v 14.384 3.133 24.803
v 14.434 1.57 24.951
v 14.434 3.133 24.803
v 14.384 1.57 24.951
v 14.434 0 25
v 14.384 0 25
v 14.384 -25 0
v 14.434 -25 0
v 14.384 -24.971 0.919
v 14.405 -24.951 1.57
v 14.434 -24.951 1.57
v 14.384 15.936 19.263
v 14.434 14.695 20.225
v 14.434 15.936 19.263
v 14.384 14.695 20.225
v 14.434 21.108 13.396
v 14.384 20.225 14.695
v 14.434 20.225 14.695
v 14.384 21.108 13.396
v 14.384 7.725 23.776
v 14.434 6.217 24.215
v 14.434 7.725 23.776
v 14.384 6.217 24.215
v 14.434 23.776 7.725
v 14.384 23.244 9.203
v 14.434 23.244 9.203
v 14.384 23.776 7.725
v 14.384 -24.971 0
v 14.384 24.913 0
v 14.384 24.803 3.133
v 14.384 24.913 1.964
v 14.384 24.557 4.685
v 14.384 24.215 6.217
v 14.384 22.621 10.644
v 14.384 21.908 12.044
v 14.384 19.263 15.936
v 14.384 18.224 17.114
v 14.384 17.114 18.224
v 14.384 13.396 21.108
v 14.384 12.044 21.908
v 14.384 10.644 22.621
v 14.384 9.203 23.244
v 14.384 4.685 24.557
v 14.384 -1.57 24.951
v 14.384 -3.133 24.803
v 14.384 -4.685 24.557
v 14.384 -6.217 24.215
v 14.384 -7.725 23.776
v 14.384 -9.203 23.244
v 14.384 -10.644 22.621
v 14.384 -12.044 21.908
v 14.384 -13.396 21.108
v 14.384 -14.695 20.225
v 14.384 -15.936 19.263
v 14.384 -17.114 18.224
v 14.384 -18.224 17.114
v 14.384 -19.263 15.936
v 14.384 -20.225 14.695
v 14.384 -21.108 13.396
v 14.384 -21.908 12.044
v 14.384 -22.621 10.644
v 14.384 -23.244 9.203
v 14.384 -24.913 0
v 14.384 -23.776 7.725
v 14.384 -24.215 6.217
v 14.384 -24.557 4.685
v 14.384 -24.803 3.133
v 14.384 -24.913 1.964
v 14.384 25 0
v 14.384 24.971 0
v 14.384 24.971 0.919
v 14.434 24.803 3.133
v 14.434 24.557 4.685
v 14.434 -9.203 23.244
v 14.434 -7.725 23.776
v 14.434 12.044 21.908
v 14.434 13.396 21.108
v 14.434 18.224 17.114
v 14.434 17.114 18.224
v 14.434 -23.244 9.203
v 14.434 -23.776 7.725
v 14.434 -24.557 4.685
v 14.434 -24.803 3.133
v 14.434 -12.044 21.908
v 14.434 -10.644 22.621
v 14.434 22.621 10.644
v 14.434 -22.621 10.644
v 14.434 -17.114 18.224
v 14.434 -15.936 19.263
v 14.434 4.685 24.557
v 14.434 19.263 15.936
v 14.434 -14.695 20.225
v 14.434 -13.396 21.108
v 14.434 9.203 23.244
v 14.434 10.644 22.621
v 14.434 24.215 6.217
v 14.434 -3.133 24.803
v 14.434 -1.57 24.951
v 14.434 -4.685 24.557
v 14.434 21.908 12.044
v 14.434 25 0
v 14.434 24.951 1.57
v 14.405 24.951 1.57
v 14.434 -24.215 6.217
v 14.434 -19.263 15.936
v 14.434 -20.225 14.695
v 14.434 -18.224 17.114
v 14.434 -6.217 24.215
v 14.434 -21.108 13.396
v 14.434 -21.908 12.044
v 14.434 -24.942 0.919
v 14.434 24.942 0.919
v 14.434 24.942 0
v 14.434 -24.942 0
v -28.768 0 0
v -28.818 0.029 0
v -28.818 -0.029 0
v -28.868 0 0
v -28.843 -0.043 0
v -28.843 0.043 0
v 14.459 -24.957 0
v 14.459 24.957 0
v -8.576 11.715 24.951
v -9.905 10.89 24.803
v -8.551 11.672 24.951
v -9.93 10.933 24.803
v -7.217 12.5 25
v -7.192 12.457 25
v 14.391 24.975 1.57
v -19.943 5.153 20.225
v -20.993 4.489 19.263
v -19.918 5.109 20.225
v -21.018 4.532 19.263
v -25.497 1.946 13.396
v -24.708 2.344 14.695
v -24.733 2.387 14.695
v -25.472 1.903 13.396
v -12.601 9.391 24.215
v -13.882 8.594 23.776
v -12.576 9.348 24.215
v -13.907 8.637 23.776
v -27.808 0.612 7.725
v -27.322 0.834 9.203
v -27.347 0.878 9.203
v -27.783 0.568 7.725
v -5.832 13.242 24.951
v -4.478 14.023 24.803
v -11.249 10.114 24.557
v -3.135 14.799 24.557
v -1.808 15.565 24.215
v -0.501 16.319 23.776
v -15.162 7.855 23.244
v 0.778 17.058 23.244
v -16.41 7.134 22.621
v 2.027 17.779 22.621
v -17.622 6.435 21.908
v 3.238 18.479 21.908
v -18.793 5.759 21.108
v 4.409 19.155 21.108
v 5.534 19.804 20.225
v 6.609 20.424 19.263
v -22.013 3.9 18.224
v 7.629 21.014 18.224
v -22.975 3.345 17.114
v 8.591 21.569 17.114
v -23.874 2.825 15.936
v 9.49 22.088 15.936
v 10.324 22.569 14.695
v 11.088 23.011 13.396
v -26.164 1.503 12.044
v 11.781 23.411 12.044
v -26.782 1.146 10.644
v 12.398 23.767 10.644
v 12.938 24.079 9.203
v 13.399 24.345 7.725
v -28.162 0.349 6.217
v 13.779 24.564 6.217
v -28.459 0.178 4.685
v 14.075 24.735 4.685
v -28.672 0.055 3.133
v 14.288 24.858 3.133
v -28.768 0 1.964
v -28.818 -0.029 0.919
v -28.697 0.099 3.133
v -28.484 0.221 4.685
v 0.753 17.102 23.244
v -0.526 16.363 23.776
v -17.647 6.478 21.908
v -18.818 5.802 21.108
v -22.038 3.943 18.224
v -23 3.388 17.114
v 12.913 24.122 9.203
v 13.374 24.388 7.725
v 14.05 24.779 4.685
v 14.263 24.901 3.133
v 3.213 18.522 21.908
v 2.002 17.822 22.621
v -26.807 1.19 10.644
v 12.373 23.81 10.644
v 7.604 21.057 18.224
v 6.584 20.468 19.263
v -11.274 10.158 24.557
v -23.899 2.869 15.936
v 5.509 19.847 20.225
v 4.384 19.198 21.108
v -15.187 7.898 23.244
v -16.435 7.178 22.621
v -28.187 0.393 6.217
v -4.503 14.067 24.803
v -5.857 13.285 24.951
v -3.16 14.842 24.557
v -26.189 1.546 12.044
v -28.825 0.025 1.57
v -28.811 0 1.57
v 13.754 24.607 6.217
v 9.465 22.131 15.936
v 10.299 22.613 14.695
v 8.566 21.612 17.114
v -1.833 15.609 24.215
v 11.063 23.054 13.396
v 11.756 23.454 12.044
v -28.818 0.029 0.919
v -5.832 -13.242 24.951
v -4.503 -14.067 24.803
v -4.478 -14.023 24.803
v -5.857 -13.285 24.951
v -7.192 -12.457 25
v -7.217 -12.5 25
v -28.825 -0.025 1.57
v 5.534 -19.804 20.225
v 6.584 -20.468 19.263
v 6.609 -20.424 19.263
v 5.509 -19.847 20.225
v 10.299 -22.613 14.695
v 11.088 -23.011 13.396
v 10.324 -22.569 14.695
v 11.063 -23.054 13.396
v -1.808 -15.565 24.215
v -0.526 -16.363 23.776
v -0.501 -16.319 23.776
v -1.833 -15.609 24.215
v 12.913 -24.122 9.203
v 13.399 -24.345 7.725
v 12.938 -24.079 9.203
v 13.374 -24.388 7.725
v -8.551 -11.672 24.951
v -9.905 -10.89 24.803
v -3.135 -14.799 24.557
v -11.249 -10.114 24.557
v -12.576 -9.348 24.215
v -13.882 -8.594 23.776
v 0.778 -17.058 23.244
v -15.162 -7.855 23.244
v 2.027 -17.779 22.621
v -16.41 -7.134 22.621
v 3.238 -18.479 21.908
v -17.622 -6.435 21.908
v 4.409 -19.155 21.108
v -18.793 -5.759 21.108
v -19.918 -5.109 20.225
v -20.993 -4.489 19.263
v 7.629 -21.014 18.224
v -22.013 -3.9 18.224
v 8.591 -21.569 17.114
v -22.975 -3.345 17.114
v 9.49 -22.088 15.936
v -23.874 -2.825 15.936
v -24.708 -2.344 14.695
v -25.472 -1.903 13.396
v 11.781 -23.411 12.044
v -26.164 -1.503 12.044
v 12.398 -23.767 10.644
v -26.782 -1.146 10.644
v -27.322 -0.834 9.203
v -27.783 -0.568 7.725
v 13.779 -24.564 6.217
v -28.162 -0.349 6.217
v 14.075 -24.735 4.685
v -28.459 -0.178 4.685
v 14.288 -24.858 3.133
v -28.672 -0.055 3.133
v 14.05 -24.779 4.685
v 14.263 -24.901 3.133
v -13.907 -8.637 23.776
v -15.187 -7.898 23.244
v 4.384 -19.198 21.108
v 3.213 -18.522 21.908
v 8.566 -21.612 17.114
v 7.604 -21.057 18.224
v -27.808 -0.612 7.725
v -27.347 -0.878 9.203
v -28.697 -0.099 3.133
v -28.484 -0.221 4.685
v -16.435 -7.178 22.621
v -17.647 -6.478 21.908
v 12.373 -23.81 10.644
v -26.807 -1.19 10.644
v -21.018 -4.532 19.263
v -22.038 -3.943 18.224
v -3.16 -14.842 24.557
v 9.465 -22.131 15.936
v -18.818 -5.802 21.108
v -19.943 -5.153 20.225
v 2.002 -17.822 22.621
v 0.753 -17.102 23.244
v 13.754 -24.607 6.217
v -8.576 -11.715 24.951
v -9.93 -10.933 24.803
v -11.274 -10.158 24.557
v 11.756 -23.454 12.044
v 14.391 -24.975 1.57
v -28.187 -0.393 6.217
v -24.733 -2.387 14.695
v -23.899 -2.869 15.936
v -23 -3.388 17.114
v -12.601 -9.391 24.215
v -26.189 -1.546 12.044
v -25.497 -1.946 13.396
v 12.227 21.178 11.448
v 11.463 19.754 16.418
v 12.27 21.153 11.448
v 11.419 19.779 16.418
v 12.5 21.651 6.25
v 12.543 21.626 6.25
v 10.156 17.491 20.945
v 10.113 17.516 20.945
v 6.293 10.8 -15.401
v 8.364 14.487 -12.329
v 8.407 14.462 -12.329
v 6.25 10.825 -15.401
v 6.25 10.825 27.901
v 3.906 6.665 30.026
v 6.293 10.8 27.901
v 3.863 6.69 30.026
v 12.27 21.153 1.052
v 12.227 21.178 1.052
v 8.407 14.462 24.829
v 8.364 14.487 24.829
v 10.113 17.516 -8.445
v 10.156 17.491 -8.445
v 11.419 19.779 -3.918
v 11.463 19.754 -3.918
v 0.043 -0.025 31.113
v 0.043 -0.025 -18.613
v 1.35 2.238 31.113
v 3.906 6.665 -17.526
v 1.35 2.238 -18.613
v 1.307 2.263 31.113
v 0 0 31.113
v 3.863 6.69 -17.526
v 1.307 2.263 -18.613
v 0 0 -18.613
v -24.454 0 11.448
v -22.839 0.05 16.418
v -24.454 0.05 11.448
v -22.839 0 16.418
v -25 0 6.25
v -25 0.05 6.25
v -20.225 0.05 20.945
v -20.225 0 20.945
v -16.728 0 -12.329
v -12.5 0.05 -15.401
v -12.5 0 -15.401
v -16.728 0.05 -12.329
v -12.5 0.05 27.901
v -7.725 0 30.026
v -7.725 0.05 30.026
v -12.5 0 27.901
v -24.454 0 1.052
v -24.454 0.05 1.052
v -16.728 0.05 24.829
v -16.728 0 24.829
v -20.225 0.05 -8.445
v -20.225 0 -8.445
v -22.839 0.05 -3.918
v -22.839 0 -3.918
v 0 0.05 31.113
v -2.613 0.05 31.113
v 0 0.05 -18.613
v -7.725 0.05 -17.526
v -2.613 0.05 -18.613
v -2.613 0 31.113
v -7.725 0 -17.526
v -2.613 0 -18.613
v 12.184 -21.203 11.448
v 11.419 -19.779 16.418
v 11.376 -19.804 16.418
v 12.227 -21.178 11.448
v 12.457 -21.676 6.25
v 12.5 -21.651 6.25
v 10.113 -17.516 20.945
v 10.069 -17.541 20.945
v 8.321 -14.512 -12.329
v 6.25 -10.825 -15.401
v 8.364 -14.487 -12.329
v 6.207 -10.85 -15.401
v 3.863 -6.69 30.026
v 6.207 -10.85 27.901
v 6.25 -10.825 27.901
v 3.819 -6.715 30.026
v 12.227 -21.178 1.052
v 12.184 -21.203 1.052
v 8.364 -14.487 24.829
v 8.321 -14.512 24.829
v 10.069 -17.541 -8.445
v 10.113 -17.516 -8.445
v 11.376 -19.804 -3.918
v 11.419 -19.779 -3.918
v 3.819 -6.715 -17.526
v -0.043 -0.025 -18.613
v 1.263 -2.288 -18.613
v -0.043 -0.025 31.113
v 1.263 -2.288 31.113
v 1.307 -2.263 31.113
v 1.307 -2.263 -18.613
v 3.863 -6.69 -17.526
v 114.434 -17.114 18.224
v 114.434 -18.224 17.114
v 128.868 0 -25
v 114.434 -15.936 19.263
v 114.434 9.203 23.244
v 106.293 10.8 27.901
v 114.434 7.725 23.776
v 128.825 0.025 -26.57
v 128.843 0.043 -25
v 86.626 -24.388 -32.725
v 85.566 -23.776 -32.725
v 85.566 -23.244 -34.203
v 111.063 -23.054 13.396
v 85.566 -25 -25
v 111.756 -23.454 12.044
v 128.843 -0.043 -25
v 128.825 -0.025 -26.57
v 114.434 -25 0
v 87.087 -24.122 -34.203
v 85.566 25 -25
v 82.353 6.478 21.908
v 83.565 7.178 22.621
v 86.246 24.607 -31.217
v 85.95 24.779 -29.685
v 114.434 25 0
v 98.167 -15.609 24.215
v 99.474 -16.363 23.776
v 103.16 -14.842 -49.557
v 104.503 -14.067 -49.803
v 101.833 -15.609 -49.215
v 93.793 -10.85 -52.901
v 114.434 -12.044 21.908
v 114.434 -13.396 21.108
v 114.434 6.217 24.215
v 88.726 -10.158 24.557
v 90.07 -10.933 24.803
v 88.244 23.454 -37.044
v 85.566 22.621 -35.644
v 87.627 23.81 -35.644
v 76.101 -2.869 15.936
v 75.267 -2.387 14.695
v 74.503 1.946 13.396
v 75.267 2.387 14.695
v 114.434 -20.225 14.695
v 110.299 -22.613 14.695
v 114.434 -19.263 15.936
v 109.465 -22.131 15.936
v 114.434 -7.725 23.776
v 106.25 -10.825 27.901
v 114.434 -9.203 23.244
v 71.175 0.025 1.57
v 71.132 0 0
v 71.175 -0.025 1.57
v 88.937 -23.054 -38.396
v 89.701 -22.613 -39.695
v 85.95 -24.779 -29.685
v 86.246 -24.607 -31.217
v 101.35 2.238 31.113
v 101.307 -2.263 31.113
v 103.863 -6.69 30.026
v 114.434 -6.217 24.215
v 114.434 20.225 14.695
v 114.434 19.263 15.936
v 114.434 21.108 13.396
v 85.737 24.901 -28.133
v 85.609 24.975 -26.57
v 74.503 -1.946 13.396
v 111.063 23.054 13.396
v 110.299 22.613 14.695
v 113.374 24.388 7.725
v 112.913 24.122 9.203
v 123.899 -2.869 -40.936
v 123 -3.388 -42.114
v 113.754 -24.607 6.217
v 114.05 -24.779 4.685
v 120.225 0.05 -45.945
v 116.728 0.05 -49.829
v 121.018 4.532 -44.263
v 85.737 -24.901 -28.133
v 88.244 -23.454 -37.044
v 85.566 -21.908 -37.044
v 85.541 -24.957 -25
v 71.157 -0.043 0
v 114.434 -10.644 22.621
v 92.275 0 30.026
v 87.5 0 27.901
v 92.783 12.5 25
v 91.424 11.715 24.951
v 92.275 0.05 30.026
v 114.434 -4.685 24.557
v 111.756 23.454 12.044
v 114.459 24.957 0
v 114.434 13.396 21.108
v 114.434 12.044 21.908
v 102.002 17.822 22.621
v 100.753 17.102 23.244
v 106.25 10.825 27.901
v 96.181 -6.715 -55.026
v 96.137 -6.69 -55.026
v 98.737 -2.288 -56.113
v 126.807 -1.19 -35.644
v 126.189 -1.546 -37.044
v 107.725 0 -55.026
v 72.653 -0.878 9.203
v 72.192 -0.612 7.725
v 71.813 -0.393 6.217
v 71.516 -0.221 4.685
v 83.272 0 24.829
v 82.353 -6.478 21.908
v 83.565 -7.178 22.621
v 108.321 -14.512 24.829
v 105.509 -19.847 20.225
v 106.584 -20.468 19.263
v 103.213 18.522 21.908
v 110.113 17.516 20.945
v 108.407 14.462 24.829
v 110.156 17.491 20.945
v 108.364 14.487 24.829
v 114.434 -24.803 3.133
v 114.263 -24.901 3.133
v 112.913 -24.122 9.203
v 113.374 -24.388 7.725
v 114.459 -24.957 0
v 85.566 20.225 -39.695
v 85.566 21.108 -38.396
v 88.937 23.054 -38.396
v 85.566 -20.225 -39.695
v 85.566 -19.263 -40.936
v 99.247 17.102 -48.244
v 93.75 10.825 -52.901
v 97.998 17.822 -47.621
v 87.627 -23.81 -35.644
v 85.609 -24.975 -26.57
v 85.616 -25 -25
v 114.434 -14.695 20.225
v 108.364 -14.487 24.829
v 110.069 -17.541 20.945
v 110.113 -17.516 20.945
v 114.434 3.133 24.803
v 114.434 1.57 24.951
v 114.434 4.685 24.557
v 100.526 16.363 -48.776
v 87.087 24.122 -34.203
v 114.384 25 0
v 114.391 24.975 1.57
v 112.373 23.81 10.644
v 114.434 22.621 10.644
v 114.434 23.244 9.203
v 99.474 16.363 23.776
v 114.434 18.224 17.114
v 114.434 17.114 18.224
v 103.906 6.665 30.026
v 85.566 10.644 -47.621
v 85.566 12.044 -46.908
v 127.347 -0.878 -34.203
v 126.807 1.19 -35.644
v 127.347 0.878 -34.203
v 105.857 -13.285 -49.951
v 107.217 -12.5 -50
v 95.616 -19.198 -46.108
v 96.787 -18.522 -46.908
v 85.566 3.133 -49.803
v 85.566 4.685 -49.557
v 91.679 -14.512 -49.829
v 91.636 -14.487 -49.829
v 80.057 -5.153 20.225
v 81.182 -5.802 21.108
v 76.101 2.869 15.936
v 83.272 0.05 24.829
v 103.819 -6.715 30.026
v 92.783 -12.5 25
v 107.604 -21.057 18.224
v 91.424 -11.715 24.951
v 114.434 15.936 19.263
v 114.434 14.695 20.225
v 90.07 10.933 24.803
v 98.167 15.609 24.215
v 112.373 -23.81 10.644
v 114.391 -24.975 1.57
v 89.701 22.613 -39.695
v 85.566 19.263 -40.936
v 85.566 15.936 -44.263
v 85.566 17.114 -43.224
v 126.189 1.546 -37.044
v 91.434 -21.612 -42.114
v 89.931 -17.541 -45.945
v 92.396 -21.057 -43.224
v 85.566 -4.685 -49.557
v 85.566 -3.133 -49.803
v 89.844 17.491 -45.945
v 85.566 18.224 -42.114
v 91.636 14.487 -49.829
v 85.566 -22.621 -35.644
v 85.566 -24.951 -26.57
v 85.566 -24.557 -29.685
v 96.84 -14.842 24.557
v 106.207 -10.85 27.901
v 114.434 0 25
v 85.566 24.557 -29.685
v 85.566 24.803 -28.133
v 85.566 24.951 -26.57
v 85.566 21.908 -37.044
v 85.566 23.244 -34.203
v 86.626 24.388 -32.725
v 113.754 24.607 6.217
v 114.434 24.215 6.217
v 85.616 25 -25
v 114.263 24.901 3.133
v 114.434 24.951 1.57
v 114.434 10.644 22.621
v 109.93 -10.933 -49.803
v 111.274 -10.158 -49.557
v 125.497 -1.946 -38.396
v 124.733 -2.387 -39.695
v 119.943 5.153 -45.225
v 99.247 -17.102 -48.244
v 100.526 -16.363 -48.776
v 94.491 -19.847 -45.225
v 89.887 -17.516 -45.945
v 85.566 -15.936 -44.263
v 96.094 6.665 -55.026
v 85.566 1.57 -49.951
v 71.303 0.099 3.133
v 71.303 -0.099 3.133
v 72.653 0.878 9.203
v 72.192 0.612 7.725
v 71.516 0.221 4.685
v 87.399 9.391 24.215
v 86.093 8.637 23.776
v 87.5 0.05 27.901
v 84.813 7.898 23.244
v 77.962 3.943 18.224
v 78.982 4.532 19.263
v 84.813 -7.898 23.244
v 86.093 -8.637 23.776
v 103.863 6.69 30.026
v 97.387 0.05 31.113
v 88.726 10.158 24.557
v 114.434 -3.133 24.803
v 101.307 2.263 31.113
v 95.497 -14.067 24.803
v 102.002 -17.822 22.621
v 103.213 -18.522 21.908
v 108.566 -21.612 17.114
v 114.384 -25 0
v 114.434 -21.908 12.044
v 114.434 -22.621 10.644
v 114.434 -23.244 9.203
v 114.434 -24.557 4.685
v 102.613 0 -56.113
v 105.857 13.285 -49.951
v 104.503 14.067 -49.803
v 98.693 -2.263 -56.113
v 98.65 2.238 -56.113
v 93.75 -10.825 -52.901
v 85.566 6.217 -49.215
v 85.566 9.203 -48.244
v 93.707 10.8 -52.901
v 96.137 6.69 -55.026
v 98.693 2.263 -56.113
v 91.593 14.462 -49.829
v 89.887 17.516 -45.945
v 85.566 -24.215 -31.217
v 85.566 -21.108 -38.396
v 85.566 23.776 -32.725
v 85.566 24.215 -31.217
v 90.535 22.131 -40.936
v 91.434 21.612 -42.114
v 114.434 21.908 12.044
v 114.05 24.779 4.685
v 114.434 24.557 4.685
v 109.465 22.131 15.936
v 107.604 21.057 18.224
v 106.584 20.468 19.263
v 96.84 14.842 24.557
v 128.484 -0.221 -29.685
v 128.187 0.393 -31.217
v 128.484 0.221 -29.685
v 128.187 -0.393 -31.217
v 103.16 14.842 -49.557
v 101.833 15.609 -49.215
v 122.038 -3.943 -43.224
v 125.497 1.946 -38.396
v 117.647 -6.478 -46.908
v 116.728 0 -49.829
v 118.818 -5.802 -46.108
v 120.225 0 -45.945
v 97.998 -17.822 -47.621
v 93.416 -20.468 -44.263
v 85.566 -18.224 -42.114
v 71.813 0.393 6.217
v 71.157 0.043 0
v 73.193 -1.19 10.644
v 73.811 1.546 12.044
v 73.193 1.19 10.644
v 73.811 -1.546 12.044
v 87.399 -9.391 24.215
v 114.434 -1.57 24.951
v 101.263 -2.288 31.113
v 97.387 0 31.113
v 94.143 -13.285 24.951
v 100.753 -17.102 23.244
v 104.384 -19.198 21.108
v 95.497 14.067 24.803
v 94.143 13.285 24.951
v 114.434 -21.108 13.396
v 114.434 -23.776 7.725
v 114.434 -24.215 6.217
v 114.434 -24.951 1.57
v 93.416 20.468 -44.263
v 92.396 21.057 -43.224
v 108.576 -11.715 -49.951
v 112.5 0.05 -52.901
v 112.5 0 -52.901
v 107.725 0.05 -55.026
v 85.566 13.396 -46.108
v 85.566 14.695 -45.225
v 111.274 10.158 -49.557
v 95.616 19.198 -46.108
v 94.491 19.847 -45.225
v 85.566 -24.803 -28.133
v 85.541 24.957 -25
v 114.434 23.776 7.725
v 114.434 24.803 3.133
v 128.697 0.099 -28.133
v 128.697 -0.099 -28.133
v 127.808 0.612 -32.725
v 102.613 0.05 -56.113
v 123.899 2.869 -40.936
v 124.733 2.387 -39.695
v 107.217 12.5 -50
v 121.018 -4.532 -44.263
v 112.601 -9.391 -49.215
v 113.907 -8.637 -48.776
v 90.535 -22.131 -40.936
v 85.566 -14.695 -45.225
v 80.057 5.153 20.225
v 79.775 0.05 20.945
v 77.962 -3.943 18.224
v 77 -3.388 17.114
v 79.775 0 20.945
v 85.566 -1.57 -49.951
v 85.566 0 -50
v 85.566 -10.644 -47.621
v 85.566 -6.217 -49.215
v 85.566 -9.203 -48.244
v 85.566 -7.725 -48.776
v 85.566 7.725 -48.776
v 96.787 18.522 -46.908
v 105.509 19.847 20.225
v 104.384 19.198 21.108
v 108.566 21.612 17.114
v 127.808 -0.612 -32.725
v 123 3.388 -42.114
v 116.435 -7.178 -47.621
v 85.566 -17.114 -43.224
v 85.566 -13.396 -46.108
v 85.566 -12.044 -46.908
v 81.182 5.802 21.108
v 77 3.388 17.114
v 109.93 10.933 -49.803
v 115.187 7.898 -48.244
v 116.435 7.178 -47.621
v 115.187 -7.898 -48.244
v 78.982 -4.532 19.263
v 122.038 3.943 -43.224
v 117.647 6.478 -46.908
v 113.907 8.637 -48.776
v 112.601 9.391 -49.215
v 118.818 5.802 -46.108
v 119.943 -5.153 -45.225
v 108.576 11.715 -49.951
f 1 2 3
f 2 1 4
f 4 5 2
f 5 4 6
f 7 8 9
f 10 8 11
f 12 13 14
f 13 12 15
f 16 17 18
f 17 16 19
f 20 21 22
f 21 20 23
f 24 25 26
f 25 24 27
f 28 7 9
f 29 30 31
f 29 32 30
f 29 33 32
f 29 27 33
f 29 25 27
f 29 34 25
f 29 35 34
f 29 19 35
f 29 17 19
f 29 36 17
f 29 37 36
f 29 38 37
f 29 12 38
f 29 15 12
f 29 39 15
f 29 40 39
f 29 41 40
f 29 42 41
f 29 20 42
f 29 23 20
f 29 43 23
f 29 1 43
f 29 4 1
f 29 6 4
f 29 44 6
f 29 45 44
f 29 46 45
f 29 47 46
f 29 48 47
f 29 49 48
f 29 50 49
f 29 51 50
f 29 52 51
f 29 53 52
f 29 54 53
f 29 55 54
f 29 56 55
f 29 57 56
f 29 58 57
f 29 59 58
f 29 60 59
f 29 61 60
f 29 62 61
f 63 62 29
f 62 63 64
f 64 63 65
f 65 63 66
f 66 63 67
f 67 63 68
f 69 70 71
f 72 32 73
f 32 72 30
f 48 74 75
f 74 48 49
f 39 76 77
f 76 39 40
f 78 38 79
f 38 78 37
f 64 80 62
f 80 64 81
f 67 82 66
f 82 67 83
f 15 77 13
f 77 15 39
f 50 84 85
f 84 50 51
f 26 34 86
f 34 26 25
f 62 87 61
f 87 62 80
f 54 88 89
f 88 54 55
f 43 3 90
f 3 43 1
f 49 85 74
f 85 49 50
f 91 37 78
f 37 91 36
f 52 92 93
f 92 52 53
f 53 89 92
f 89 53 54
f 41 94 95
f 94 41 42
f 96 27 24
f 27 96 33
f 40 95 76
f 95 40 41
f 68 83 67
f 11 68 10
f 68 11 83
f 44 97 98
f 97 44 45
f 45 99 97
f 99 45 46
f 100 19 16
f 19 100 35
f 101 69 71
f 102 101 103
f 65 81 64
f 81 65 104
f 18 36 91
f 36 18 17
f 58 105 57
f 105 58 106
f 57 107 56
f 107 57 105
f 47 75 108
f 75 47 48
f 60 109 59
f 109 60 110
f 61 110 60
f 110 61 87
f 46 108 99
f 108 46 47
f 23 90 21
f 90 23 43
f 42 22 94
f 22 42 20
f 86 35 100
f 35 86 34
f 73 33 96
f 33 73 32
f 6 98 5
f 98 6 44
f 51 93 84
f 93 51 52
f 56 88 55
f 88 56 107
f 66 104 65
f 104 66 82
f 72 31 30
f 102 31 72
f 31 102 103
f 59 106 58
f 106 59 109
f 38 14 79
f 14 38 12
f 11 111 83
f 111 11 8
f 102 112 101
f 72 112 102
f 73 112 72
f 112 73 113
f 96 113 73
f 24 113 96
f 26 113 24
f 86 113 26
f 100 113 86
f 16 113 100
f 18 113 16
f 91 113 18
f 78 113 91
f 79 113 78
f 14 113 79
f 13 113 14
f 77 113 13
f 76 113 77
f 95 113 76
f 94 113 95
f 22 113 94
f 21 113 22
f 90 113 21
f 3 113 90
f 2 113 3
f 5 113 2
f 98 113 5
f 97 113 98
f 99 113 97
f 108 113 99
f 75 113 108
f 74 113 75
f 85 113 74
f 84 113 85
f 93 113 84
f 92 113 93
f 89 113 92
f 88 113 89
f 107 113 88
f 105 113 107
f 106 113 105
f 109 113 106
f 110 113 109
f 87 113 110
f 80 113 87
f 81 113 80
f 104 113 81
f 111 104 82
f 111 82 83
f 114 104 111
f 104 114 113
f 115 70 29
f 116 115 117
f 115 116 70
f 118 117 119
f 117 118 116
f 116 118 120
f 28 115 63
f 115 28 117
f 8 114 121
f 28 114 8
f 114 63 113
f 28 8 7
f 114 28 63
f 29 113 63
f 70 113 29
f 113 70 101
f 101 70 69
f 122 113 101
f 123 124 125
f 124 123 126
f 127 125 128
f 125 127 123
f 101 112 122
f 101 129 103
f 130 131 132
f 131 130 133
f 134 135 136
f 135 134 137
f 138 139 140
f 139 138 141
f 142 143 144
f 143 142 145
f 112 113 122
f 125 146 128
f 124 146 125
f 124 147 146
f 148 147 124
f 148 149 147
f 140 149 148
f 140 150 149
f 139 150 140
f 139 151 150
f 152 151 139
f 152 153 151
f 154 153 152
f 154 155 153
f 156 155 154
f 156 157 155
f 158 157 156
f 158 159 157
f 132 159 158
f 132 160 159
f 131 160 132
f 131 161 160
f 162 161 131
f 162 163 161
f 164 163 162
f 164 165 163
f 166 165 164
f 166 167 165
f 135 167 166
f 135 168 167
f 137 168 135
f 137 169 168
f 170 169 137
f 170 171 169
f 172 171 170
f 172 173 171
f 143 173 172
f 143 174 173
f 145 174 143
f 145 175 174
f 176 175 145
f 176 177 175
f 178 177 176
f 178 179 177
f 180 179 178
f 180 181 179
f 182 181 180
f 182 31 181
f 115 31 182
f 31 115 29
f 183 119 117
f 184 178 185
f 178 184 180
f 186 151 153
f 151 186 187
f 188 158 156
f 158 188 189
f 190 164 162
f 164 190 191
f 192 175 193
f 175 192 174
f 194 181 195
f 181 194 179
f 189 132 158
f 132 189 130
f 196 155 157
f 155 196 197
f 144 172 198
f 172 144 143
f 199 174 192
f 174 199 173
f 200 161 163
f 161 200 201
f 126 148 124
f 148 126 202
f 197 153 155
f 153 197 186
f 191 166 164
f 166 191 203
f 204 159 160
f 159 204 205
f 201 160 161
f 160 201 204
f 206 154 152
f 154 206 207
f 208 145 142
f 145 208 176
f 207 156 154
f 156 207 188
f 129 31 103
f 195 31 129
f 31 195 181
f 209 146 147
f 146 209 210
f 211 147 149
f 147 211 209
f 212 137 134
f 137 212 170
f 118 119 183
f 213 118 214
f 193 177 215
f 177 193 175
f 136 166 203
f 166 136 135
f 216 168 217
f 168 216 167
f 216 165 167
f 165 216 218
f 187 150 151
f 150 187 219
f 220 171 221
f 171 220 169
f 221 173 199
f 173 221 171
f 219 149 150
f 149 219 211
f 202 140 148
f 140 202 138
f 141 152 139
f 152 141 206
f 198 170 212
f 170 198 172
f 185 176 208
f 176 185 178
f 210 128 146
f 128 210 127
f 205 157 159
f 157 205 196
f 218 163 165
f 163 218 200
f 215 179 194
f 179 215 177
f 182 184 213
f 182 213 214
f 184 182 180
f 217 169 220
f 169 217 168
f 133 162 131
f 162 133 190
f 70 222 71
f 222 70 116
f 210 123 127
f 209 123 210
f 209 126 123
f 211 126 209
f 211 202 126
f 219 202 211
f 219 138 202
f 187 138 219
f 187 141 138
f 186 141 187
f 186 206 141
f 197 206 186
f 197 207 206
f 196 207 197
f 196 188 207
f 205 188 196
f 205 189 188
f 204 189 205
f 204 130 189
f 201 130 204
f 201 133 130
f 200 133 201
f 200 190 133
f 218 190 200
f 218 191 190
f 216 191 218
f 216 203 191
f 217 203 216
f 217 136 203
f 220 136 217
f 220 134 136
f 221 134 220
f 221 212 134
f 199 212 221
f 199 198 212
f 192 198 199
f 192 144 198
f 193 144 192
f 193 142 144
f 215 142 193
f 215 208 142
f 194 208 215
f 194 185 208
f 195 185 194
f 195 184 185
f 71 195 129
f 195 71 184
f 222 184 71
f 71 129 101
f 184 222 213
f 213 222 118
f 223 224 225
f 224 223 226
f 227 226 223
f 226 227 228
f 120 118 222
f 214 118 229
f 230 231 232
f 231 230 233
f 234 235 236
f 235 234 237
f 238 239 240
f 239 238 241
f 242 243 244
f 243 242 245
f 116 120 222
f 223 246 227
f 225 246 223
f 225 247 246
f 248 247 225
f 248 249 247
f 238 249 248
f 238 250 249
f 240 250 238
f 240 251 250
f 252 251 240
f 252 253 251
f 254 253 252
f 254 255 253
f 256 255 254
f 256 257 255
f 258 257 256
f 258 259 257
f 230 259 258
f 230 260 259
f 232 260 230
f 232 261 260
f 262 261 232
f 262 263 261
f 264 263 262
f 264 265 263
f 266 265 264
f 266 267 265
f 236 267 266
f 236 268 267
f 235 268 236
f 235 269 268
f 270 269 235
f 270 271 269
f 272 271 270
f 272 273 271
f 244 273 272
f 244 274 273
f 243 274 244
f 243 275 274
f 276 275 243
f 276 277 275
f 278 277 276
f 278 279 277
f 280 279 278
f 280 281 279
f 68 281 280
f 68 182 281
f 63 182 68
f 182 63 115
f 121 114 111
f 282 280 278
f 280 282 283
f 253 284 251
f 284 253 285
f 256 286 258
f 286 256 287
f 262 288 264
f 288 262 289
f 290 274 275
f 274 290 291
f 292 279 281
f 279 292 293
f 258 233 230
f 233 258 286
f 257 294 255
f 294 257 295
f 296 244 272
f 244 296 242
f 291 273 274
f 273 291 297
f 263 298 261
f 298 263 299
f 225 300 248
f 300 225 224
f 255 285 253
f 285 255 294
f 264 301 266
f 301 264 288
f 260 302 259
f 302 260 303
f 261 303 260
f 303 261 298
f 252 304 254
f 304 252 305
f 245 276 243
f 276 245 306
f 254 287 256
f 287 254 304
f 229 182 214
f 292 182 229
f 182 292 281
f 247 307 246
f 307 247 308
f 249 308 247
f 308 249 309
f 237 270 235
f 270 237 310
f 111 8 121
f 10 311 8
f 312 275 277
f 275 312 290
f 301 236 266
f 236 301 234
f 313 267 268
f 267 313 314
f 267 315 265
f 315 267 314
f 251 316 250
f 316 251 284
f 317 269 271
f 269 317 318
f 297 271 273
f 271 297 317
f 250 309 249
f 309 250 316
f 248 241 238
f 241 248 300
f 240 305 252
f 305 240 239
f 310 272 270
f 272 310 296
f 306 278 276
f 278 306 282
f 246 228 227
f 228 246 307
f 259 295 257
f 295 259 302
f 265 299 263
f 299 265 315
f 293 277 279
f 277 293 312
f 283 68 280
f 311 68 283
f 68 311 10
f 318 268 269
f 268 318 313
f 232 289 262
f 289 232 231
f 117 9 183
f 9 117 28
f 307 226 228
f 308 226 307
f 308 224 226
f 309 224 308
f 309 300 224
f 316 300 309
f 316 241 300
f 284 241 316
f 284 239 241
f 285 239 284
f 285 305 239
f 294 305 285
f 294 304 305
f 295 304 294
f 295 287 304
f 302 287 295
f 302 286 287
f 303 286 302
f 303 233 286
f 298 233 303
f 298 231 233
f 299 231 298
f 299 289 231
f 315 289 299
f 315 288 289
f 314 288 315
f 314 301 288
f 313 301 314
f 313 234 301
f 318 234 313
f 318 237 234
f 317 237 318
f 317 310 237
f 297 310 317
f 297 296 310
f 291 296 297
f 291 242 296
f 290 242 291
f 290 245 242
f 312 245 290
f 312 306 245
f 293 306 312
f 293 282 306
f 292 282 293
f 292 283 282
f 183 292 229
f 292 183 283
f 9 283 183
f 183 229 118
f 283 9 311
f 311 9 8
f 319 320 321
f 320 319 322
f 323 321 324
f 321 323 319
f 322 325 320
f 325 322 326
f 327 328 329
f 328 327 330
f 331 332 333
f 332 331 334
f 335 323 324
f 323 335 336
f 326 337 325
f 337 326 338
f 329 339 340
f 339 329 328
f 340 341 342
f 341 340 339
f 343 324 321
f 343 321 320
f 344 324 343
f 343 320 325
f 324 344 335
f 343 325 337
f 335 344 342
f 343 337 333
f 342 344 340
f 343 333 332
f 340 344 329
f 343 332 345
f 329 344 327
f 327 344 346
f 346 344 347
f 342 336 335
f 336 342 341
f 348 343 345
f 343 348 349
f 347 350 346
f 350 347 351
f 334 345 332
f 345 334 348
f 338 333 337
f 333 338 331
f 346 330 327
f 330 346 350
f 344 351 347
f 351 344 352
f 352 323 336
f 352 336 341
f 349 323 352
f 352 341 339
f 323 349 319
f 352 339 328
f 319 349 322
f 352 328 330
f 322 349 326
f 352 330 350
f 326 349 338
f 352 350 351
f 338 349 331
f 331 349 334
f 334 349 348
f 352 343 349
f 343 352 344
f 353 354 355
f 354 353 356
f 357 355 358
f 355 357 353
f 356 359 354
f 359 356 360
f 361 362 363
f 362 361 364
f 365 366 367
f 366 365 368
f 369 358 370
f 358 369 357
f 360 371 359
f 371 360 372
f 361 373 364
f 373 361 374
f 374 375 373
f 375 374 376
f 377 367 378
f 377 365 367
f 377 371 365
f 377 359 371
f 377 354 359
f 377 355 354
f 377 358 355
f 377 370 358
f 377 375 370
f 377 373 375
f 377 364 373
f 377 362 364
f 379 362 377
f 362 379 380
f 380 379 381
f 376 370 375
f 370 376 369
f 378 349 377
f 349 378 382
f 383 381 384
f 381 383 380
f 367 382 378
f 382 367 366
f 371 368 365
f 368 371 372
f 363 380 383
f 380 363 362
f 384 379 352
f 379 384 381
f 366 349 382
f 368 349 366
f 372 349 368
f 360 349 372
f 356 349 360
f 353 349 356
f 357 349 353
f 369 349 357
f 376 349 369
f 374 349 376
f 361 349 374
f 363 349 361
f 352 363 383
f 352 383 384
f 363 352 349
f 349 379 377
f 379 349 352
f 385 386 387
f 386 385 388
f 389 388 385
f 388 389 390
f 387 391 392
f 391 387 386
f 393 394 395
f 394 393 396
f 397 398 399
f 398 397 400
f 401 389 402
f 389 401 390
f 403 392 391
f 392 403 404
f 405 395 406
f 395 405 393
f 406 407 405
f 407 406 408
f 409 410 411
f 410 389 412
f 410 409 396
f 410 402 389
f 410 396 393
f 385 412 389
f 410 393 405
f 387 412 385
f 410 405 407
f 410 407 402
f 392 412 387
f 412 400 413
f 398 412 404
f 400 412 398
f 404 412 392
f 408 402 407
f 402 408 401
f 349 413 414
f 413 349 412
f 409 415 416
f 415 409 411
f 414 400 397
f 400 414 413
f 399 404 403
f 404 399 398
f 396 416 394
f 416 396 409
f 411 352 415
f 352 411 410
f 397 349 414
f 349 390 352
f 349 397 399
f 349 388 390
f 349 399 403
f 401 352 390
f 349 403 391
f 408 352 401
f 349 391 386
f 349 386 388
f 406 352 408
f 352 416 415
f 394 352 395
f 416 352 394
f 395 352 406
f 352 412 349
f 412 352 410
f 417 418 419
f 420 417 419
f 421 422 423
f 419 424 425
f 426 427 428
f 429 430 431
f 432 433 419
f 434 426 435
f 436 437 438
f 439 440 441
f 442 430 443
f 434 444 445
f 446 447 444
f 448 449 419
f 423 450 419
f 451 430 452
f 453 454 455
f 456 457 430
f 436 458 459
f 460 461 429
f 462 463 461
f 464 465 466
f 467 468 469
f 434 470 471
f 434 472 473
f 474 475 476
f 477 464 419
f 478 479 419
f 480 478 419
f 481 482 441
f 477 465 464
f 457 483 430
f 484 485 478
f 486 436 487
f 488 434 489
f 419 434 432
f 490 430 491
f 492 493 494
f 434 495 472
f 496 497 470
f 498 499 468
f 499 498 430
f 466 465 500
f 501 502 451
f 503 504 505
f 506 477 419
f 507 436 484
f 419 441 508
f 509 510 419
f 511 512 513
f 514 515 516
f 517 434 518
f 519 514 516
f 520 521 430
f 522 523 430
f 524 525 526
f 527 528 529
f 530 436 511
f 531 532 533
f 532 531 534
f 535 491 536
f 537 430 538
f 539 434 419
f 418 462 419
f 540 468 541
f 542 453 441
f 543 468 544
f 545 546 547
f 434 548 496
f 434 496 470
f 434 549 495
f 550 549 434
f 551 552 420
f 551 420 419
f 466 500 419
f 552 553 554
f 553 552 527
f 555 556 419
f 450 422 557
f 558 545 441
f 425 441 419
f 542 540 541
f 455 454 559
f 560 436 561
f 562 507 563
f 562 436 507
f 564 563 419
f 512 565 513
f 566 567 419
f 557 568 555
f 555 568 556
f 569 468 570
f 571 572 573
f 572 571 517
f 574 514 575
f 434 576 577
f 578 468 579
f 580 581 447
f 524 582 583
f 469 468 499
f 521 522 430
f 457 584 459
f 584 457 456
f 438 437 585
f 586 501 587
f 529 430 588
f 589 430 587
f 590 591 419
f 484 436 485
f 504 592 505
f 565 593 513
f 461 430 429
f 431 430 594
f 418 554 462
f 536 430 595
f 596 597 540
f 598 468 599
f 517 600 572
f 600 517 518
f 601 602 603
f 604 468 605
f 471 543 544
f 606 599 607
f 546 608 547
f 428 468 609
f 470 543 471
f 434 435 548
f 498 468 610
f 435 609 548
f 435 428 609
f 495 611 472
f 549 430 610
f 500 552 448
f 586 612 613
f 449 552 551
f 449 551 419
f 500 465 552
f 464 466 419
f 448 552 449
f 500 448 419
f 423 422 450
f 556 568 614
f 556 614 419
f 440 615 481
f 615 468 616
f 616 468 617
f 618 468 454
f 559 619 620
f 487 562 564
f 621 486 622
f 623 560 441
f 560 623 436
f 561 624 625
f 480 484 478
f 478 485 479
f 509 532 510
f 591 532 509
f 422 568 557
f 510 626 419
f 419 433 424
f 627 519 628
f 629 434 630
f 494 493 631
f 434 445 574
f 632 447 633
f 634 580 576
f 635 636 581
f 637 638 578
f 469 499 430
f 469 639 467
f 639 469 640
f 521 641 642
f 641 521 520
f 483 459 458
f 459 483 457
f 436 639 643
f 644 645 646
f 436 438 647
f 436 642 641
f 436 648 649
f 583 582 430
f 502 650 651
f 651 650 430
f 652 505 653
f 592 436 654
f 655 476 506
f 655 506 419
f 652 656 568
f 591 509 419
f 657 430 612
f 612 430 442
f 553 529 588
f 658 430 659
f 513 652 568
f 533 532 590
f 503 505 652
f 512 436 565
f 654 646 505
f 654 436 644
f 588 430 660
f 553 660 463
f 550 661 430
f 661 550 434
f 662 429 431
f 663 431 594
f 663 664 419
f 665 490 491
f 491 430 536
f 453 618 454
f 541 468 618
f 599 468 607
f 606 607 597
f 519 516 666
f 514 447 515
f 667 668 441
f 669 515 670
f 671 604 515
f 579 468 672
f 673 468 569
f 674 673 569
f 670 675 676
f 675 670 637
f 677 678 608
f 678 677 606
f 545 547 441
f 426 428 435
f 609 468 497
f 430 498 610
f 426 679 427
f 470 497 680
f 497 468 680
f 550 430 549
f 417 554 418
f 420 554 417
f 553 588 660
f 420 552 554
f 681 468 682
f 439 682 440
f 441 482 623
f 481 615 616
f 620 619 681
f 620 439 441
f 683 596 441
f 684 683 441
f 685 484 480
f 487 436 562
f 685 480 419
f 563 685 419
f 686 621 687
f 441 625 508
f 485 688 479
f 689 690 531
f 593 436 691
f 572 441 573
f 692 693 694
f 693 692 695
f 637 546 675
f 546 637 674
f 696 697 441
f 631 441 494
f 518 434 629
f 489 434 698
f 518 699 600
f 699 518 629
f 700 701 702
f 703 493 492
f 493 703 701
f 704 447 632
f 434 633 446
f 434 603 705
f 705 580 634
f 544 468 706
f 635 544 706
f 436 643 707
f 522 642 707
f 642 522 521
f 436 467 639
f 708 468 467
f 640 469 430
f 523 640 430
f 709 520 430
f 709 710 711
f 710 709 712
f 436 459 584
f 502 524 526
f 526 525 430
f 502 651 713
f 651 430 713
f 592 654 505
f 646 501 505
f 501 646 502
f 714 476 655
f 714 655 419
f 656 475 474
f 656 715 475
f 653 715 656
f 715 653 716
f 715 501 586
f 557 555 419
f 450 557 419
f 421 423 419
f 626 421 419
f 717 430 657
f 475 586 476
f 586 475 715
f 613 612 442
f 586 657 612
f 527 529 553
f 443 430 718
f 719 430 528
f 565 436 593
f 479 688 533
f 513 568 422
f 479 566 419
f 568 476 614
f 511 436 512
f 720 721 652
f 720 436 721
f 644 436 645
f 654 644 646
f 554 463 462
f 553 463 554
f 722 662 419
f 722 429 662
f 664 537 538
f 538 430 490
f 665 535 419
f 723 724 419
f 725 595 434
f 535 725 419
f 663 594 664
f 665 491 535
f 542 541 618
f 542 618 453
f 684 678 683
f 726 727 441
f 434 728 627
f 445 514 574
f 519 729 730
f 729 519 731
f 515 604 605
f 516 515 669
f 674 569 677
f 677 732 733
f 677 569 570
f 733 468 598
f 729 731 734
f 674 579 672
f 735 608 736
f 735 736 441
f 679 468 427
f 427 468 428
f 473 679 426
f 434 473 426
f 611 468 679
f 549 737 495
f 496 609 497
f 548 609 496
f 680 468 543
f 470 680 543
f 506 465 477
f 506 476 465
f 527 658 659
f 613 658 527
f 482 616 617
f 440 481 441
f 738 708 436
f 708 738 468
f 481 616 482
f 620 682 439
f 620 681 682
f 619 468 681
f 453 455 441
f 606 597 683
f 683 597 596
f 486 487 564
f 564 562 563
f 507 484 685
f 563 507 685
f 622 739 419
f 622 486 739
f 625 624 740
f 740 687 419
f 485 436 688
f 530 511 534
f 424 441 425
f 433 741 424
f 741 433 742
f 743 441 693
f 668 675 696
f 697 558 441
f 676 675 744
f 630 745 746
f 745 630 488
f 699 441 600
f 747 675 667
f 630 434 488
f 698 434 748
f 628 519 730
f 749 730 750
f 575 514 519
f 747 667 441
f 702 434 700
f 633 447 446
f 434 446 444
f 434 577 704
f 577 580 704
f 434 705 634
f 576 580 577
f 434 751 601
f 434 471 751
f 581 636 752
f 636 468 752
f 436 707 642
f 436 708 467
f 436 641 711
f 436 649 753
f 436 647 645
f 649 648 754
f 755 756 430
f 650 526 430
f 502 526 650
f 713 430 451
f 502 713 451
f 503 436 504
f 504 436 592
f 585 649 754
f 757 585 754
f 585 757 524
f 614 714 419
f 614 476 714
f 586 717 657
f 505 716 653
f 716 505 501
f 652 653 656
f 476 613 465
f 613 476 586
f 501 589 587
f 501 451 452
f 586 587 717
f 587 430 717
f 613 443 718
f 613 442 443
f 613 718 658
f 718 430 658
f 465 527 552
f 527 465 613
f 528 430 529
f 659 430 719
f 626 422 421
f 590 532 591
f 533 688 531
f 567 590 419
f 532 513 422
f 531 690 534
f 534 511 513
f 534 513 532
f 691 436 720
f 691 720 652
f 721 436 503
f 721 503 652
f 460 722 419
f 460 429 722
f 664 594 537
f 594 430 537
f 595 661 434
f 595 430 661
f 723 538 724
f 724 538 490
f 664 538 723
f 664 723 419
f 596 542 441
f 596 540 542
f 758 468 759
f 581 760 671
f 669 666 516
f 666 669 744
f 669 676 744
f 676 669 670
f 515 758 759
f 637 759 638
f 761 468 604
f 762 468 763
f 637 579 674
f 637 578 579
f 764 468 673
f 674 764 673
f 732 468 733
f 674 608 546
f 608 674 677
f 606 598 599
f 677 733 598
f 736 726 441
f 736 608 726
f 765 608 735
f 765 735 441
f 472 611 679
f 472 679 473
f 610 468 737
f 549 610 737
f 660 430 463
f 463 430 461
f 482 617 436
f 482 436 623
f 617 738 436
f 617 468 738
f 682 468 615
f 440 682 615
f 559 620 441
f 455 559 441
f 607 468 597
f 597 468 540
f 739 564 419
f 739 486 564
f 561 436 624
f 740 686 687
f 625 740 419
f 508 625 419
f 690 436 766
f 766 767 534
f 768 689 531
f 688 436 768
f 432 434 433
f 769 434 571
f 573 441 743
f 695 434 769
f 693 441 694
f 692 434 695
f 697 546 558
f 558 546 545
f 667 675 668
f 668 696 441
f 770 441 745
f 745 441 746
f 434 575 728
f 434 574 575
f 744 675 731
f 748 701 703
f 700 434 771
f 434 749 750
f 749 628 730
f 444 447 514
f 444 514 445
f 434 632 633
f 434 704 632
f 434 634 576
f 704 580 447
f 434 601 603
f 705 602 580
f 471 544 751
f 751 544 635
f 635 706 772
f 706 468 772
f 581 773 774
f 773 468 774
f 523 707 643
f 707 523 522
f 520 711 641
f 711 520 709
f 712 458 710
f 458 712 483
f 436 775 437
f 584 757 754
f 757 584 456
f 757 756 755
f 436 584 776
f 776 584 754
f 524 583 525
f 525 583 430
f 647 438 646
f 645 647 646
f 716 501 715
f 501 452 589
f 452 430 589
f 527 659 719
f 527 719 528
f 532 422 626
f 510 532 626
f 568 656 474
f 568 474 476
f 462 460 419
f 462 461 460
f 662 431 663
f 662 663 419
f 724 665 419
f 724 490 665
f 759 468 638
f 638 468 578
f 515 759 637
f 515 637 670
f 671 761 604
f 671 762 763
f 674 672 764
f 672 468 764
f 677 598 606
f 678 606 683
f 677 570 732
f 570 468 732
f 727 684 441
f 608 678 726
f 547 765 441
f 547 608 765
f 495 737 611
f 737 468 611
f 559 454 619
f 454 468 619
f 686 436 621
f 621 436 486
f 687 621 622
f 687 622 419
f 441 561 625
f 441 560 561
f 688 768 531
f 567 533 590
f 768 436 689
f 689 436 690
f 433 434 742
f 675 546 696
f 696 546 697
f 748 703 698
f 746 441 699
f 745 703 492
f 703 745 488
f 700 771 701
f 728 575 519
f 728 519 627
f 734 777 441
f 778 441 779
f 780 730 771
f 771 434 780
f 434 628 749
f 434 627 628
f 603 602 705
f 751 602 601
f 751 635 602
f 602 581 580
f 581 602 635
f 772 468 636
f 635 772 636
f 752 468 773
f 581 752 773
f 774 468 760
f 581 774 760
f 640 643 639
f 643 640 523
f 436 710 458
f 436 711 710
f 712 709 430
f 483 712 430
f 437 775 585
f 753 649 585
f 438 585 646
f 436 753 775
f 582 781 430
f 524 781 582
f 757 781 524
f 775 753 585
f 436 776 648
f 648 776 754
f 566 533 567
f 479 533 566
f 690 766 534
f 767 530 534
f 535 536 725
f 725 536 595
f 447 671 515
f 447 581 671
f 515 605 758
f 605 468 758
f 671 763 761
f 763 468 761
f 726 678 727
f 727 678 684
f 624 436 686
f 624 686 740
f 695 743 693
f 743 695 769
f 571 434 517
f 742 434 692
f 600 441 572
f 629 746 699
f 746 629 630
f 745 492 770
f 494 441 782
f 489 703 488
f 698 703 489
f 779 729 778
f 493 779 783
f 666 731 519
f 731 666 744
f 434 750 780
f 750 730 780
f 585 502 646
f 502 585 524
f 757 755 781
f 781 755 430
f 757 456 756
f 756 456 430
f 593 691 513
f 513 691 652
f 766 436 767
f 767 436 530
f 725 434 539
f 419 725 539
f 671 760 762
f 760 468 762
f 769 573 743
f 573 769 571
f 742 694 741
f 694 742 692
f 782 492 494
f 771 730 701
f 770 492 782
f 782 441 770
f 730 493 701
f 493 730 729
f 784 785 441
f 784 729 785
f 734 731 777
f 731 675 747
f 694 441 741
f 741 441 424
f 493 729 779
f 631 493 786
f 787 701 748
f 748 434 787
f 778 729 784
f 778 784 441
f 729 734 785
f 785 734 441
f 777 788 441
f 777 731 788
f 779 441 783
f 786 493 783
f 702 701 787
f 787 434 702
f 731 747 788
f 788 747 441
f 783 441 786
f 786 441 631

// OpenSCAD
diameter = 50;
radius = diameter / 2;



//module cap(){
//
//    intersection(){
//        sphere(d = diameter);
//
//
//        linear_extrude(diameter)
//        polygon([
//            radius * [cos(0), sin(0)],
//            radius * [cos(120), sin(120)],
//            radius * [cos(240), sin(240)]
//
//        ]);
//    }
//}
//
//
//
//
//
//hull(){
//    cap();
//
//
//    translate([0, 0, -radius])
//    rotate([0, 180, 0]) cap();
//}
twist = 0;
modifier = 10;

module coin(){
    rotate([0, -90 + twist, 0])
    intersection() {
        cylinder(h=0.1, d=diameter,center=true, $fn=100);
            translate([0, -radius, 0]) cube(diameter);
    }
}

module half_circle(){
    rotate([90, 0, 0])
    intersection() {
        cylinder(h=0.1, d=diameter,center=true);
        translate([0, -radius, 0]) cube(diameter);
    }
}


s = radius * sqrt(3)/3;
//d = cos(asin(1/3)) * diameter;



d =   radius;

echo(asin(1/3));
echo(cos(asin(1/3)));

t = radius * 0.25;

module cap(){
    rotate([0, 0, 0]) translate([s, 0, 0]) coin();
    rotate([0, 0, 120]) translate([s, 0, 0]) coin();
    rotate([0, 0, 240]) translate([s, 0, 0]) coin();
    
    rotate([0, 0, 60]) translate([0, 0, t]) half_circle();
    rotate([0, 0, 180]) translate([0, 0, t]) half_circle();
    rotate([0, 0, 300]) translate([0, 0, t]) half_circle();
}


cap();

translate( diameter * [2, 0, 0])
hull(){
    cap();
    translate([0,0,-d]) rotate([180, 0, 60]) cap();
}
//
//module coins(){
//    rotate([0, 0, 0]) translate([s, 0, 0]) coin();
//    rotate([0, 0, 120]) translate([s, 0, 0]) coin();
//    rotate([0, 0, 240]) translate([s, 0, 0]) coin();
//
//
//    rotate([0, 0, 60]) translate([s, 0, -d]) mirror([0,0,1])coin();
//    rotate([0, 0, 180]) translate([s, 0, -d]) mirror([0,0,1])coin();
//    rotate([0, 0, 300]) translate([s, 0, -d]) mirror([0,0,1])coin();
//}
//
//
//
//
//
//
//module o_coins(){
//    coin();
//    rotate([0, 0, 90]) translate([0, 0, -radius]) coin();
//}
//
//
//coins();
//translate([2 * diameter, 0, 0])
//hull(){ coins();}
//
//translate([0, 2 * diameter, 0]) o_coins();
//hull(){translate([2 * diameter, 2 * diameter, 0]) o_coins();};
//
//
//
//
//translate([4 * diameter, 0, 0])
//intersection(){
//    translate([-diameter, -diameter, -d/2]) cube(diameter * [2, 2, 2]);
//    hull(){ coins();}
//};
//
//
//
//module tri_coins(){
//    rotate([0, 0, 0]) translate([0, 0, 0]) half_circle();
//    rotate([0, 0, 120]) translate([0, 0, 0]) half_circle();
//    rotate([0, 0, 240]) translate([0, 0, 0]) half_circle();
//    
//    rotate([0, 0, 60]) translate([0, 0, -d]) half_circle();
//    rotate([0, 0, 180]) translate([0, 0, -d]) half_circle();
//    rotate([0, 0, 300]) translate([0, 0, -d]) half_circle();
//
//    
//}
//
//
//
//
//translate([0, -2 * diameter, 0]) tri_coins();
//
//hull(){
//    translate([2 * diameter, -2 *diameter, 0]) tri_coins();
//    
//    
//    
//}
//
//translate([4 * diameter, -2 * diameter, 0])
//intersection(){
//    translate([-diameter, -diameter, -d/2]) cube(diameter * [2, 2, 2]);
//    hull(){ tri_coins();}
//};
